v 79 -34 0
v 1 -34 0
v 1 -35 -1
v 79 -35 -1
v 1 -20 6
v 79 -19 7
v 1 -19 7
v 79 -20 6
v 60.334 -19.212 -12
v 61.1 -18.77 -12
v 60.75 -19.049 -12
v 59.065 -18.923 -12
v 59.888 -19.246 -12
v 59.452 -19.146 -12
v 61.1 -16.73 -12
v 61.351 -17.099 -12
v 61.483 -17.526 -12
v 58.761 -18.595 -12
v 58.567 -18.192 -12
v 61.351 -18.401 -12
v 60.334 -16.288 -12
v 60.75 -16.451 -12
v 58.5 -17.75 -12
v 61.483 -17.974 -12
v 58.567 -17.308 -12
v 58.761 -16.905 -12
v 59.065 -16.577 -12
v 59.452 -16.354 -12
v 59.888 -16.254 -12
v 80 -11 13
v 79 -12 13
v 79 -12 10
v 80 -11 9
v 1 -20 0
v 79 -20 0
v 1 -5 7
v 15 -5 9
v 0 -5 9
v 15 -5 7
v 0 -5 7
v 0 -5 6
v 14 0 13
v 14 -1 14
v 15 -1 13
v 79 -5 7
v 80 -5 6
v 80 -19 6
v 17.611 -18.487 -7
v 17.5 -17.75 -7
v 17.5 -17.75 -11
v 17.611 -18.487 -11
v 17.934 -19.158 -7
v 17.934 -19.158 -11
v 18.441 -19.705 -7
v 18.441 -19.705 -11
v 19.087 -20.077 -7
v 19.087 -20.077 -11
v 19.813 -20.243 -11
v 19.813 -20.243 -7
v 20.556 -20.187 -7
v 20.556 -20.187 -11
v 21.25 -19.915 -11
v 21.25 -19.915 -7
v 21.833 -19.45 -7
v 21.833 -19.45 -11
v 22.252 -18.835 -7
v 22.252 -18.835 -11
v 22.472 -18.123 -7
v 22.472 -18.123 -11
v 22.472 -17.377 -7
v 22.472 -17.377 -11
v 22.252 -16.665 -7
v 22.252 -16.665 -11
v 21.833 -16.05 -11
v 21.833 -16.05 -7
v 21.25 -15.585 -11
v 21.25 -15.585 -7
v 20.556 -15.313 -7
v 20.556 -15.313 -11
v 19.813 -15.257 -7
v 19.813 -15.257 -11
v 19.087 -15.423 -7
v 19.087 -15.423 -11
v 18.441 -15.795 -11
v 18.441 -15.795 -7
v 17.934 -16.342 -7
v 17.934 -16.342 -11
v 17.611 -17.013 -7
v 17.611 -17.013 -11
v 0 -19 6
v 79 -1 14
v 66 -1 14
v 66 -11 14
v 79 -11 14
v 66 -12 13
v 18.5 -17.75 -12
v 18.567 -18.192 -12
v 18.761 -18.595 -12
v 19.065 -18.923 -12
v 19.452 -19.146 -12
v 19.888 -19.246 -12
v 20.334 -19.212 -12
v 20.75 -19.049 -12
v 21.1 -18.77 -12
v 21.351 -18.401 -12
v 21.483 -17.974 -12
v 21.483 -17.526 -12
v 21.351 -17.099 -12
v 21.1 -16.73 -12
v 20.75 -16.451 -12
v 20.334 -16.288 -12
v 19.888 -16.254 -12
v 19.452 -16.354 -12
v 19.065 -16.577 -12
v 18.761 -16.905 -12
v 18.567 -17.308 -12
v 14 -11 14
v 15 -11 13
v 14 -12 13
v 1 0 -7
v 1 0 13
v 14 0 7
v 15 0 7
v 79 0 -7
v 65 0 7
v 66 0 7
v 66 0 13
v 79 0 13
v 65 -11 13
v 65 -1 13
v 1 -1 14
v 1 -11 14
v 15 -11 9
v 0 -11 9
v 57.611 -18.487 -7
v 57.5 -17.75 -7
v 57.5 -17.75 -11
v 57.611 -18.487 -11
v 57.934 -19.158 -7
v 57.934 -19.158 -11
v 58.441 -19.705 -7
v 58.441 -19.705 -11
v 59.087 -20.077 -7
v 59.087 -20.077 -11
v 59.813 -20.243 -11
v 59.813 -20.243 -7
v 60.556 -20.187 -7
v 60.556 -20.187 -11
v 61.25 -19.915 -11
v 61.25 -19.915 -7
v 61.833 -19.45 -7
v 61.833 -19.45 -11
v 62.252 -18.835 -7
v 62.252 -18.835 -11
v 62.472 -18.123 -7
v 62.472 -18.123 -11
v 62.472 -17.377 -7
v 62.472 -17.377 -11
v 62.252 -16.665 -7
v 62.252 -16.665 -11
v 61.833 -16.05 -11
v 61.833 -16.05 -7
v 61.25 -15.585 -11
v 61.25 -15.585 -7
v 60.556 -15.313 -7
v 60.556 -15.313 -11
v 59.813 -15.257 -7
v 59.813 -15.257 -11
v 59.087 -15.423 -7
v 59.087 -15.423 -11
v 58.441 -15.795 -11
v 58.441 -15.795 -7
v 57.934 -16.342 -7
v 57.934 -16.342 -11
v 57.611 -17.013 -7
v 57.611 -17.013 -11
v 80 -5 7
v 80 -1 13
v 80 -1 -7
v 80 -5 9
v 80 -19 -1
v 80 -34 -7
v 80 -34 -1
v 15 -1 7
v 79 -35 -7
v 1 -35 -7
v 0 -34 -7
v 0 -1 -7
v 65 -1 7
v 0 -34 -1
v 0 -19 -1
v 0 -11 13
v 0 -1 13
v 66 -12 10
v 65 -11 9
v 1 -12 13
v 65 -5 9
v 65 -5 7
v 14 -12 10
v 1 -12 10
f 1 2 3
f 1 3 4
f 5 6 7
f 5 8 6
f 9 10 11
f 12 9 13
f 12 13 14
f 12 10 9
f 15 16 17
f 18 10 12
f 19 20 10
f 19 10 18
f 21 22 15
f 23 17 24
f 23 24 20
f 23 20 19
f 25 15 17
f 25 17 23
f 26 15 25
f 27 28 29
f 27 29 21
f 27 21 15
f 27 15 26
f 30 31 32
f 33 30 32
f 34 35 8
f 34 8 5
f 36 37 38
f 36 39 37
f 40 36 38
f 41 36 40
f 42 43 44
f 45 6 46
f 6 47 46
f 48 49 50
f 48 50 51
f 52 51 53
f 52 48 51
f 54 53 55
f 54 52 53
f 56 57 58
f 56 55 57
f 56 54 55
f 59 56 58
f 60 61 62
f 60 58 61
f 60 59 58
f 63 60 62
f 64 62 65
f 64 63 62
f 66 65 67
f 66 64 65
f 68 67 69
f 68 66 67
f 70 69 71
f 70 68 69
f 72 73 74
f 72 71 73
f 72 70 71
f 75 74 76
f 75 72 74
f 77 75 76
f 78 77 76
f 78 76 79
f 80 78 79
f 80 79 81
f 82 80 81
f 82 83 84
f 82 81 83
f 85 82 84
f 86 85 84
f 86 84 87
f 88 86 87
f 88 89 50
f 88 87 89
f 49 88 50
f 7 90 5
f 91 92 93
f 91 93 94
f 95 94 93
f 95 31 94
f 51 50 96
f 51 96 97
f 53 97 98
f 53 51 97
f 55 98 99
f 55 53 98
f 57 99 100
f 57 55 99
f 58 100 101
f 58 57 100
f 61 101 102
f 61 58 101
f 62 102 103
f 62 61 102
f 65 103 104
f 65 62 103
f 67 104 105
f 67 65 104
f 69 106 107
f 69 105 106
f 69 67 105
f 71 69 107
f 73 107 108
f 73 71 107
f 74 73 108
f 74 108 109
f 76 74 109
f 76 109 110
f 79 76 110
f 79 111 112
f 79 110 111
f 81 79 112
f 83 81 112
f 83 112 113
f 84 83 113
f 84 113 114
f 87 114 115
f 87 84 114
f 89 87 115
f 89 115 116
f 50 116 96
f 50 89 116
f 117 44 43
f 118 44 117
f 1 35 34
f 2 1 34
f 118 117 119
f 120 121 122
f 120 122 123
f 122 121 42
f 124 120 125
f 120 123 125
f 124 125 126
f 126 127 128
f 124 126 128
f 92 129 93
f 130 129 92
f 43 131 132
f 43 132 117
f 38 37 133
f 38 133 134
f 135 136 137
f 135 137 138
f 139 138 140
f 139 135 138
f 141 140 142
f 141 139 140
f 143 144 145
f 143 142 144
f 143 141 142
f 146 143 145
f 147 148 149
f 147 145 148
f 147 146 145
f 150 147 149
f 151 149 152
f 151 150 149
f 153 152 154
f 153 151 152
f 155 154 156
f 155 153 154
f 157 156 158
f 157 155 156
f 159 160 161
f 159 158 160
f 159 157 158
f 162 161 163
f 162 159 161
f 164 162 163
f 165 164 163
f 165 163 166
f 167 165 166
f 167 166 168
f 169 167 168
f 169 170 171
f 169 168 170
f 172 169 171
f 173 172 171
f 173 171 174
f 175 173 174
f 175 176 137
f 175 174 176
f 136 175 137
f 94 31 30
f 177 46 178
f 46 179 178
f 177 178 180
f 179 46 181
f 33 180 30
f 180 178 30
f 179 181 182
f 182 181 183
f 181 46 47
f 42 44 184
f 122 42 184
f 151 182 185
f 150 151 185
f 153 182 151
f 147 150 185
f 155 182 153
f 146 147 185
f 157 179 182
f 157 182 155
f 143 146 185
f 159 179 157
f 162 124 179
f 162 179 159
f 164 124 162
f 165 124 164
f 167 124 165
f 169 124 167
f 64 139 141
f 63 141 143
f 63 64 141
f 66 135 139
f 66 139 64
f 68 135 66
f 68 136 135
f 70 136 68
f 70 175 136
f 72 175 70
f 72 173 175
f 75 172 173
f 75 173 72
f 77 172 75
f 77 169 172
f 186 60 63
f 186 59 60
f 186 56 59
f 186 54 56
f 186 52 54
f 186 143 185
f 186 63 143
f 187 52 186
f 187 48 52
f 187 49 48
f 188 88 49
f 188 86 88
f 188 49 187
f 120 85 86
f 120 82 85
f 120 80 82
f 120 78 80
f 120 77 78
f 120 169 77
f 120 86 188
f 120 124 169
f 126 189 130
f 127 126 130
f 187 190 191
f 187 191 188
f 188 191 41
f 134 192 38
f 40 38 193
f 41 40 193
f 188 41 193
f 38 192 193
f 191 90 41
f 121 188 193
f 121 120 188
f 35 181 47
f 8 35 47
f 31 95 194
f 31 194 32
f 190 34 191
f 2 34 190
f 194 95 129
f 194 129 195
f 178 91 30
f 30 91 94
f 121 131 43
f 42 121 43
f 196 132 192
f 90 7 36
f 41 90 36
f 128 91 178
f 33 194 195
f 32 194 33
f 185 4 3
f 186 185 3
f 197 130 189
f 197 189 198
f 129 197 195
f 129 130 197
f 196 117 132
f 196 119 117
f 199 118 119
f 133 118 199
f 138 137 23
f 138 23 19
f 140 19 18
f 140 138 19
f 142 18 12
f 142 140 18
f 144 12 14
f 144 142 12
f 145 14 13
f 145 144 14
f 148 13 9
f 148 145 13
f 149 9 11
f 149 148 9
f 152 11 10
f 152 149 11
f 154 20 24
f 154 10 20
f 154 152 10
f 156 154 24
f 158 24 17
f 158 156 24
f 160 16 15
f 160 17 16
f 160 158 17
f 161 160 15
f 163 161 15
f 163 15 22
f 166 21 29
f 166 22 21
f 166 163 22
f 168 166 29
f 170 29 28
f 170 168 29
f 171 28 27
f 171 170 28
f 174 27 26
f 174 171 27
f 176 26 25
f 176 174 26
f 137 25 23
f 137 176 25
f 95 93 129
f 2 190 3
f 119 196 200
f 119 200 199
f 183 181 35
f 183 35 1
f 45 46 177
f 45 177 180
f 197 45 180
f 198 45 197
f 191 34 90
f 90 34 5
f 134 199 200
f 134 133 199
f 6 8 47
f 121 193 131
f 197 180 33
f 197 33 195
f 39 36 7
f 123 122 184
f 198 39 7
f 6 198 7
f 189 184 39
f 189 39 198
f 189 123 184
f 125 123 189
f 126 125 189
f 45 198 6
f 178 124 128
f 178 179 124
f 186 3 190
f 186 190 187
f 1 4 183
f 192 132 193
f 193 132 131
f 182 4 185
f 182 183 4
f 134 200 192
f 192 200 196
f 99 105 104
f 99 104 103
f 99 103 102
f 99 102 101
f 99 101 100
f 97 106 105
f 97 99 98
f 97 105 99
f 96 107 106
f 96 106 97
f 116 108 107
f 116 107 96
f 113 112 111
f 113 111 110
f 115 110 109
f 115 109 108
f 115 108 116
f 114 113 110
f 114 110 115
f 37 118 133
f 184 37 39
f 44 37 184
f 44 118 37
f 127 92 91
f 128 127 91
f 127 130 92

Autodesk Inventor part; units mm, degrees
ref_plane "YZ Plane" through (0, 0, 0) normal (1, 0, 0) x (0, 1, 0)
ref_plane "XZ Plane" through (0, 0, 0) normal (0, 1, 0) x (-1, 0, 0)
ref_plane "XY Plane" through (0, 0, 0) normal (0, 0, 1) x (1, 0, 0)
sketch "Sketch1" plane through (0, 0, 0) normal (0, 0, 1) x (1, 0, 0)
  line L0 (0, 0) -> (80, 0)
  line L1 (80, 0) -> (80, -20)
  line L2 (80, -20) -> (0, -20)
  line L3 (0, -20) -> (0, 0)
  dimension "d0" = 80
  dimension "d1" = 20
extrude "Extrusion1" add sketch "Sketch1" along normal blind 7
sketch "Sketch2" plane through (0, 0, 7) normal (0, 0, 1) x (1, 0, 0)
  line L0 (0, 0) -> (80, 0)
  line L1 (80, 0) -> (80, -5)
  line L2 (80, -5) -> (0, -5)
  line L3 (0, -5) -> (0, 0)
  dimension "d4" = 80
  dimension "d5" = 5
extrude "Extrusion2" add sketch "Sketch2" along normal blind 7
sketch "Sketch3" plane through (0, -5, 7) normal (0, -1, 0) x (1, 0, 0)
  line L0 (0, -7) -> (0, 7) projected
  line L1 (0, 7) -> (80, 7)
  line L2 (80, 7) -> (80, 2)
  line L3 (80, 2) -> (0, 2)
  line L4 (0, 2) -> (0, 7)
  dimension "d8" = 80
  dimension "d9" = 5
extrude "Extrusion3" add sketch "Sketch3" along normal blind 7
sketch "Sketch6" plane through (0, 0, 14) normal (0, 0, 1) x (1, 0, 0)
  line L0 (80, 0) -> (0, 0) projected
  line L1 (1, -12) -> (79, -12) projected
  line L2 (15, 0) -> (65, 0)
  line L3 (65, 0) -> (65, -12)
  line L4 (65, -12) -> (15, -12)
  line L5 (15, -12) -> (15, 0)
  line L6 (0, -1) -> (0, -11) projected
  point P0 (79, 0)
  point P1 (1, 0)
  dimension "d28" = 50
  dimension "d29" = 15
extrude "Extrusion6" cut sketch "Sketch6" against normal blind 7
sketch "Sketch7" plane through (0, 0, 0) normal (0, 0, -1) x (-1, 0, 0)
  line L0 (0, 0) -> (-80, 0)
  line L1 (-80, 0) -> (-80, -35)
  line L2 (-80, -35) -> (0, -35)
  line L3 (0, -35) -> (0, 0)
  dimension "d38" = 80
  dimension "d39" = 35
extrude "Extrusion7" add sketch "Sketch7" along normal blind 7
sketch "Sketch8" plane through (0, 0, -7) normal (0, 0, -1) x (-1, 0, 0)
  circle A0 centre (-20, -17.75) radius 2.5
  line L0 (0, 0) -> (-80, 0) projected
  line L1 (0, -35) -> (0, 0) projected
  dimension "d42" = 5
  dimension "d43" = 17.75
  dimension "d44" = 20
extrude "Extrusion8" add sketch "Sketch8" along normal blind 5
sketch "Sketch9" plane through (0, 0, -7) normal (0, 0, -1) x (-1, 0, 0)
  circle A0 centre (-60, -17.75) radius 2.5
  line L0 (0, 0) -> (-80, 0) projected
  line L1 (-80, 0) -> (-80, -35) projected
  dimension "d47" = 5
  dimension "d48" = 17.75
  dimension "d49" = 20
extrude "Extrusion9" add sketch "Sketch9" along normal blind 5
chamfer "Chamfer5" distance 1 angle 45 30 edges at (0, -35, -3.5) (0, -27.5, 0) (0, -20, 3.5) (0, -12.5, 7) (40, -20, 7) (40, -35, 0) (0, 0, 3.5) (22.5, -17.75, -12) (62.5, -17.75, -12) (0, -6, 14) (72.5, -12, 14) (7.5, -12, 14) (15, -6, 14) (7.5, 0, 14) (7.5, -12, 9) (0, -12, 11.5) (15, -12, 11.5) (65, 0, 10.5) (65, -6, 14) (65, -12, 11.5) (72.5, -12, 9) (80, -12, 11.5) (80, -6, 14) (72.5, 0, 14) (80, 0, 3.5) (80, -35, -3.5) (80, -27.5, 0) (80, -20, 3.5) (80, -12.5, 7) (15, 0, 10.5)
properties part number "euro_box_center"
